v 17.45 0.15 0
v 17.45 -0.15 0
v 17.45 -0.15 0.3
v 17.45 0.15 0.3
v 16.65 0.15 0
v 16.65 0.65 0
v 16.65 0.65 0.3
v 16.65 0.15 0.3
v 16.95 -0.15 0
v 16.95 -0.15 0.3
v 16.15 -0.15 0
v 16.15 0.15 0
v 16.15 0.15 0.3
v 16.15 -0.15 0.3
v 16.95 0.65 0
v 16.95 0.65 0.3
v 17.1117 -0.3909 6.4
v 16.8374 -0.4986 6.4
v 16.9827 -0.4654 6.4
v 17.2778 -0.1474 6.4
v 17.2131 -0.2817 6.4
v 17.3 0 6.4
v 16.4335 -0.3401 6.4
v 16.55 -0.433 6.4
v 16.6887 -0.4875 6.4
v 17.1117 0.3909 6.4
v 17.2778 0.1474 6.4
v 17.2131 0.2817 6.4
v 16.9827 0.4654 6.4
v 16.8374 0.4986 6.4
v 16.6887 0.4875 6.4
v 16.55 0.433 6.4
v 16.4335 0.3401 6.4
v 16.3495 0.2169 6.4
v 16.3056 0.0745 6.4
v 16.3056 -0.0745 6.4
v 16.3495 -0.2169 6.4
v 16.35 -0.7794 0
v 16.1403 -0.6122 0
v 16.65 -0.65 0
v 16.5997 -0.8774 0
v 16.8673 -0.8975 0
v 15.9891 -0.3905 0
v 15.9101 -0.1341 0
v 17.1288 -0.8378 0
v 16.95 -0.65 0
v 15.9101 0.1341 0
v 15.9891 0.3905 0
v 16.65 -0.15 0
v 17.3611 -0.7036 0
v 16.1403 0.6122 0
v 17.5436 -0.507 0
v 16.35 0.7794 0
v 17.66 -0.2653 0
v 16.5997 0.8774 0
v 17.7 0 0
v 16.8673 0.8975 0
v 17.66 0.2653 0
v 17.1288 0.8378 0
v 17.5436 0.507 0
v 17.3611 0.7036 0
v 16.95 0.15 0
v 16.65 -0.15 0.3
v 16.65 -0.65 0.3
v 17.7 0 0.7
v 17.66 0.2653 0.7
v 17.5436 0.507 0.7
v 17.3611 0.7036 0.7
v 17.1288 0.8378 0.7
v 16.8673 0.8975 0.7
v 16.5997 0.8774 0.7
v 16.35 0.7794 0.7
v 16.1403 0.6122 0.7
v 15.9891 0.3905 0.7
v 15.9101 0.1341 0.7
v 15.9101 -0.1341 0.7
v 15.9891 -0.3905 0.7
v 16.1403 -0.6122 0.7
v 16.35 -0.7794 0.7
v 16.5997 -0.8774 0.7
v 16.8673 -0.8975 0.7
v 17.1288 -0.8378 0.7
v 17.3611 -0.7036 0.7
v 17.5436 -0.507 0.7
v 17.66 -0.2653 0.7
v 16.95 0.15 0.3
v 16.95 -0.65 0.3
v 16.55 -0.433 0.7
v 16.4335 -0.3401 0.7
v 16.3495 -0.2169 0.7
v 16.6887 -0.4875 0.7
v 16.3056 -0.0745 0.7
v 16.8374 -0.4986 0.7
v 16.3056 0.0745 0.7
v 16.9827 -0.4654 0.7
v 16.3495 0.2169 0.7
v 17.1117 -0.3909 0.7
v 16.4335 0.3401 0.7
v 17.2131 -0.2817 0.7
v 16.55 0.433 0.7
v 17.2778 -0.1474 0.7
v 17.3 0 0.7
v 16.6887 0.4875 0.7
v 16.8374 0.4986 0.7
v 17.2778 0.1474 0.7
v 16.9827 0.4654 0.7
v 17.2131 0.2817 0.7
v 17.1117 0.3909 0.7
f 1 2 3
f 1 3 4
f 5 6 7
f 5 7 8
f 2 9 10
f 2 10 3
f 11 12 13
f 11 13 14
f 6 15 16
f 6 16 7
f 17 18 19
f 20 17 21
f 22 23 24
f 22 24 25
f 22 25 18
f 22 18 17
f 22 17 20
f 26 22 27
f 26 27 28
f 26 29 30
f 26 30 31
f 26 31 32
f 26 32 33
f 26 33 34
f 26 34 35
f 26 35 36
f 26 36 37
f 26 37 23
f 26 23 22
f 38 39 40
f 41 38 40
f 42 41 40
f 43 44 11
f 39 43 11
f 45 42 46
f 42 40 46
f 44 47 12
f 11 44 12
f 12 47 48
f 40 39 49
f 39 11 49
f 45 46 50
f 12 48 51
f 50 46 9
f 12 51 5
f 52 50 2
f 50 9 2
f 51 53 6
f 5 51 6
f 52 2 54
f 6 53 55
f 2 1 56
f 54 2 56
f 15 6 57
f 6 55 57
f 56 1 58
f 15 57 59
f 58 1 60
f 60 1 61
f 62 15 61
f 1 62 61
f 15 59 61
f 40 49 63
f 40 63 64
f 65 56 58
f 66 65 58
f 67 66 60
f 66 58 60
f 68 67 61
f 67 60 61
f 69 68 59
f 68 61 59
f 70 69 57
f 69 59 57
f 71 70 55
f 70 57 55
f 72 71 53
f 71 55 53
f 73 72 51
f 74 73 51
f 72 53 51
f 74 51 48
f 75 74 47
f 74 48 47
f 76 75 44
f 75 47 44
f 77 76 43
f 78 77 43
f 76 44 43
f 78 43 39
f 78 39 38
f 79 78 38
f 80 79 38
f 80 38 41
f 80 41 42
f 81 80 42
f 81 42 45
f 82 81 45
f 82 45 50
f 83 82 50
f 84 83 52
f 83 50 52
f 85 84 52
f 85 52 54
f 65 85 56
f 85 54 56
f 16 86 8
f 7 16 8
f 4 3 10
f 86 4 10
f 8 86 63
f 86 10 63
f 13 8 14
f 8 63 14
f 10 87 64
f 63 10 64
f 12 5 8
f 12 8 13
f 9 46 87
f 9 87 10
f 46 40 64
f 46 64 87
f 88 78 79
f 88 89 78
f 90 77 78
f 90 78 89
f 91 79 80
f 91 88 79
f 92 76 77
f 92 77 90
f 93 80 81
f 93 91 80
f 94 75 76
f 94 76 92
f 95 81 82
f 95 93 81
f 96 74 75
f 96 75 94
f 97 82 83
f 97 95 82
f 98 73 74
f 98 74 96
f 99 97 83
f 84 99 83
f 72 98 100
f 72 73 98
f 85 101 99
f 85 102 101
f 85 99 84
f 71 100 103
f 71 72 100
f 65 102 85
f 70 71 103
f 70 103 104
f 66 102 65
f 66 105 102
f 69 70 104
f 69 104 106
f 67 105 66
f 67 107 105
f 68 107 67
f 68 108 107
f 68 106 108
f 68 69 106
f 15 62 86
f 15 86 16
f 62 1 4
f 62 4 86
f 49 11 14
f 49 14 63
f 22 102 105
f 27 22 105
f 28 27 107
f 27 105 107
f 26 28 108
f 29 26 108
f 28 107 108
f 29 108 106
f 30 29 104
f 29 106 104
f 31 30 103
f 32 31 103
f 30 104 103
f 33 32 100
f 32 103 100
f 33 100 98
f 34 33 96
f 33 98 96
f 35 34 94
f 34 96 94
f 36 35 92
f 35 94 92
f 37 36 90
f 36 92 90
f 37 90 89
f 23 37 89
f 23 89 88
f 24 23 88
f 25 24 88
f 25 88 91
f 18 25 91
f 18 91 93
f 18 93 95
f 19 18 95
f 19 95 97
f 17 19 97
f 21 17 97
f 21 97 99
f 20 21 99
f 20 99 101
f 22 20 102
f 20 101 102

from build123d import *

# Parameters (mm, degrees)
SKETCH008_R     = 0.9
PAD007_DEPTH    = 0.7
SKETCH009_R     = 0.5
PAD008_DEPTH    = 5.7
POCKET001_DEPTH = 0.3


with BuildPart() as part:
    # Sketch008 → Pad007 (new body)
    with BuildSketch(Plane.XY):
        Circle(SKETCH008_R)
    extrude(amount=PAD007_DEPTH)

    # Sketch009 (on Face3 of Pad007) → Pad008 (join)
    with BuildSketch(Plane.XY.offset(0.7)):
        Circle(SKETCH009_R)
    extrude(amount=PAD008_DEPTH)

    # Sketch010 (on Face2 of Pad008) → Pocket001 (cut)
    with BuildSketch(Plane(origin=(0, 0, 0), x_dir=(1, 0, 0), z_dir=(0, 0, -1))):
        Polygon((-0.15, 0.15), (-0.15, 0.65), (0.15, 0.65), (0.15, 0.15), (0.65, 0.15), (0.65, -0.15), (0.15, -0.15), (0.15, -0.65), (-0.15, -0.65), (-0.15, -0.15), (-0.65, -0.15), (-0.65, 0.15), align=None)
    extrude(amount=-POCKET001_DEPTH, mode=Mode.SUBTRACT)


with BuildPart() as part_1:
    # Body003 placement: moved
    add(part.part.moved(Location((16.8, 0, 0))))


solid = part_1.part
